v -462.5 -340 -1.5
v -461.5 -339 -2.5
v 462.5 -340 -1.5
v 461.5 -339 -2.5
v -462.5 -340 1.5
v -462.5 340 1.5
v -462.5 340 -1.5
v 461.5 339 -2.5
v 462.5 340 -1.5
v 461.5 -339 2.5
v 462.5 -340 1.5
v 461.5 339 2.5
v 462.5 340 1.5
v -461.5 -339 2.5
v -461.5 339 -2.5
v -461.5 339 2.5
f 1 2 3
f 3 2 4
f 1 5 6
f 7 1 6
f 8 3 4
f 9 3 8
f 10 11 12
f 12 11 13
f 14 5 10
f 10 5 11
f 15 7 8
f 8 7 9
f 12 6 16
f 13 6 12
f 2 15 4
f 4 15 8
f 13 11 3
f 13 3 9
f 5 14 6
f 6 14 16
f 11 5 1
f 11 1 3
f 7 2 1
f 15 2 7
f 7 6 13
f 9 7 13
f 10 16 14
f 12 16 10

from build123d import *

# Parameters (mm, degrees)
F0_W     = 925
F0_H     = 680
F1_DEPTH = 2.5
F2_SIZE  = 1
F3_SIZE  = 1


with BuildPart() as f1:
    # F0 (on Top) → F1 (new body, symmetric)
    with BuildSketch(Plane.XY):
        Rectangle(F0_W, F0_H)
    extrude(amount=F1_DEPTH, both=True)

    # F2
    f2_edges = [f1.edges().sort_by_distance(p)[0] for p in [
        (0, -340, 2.5),
        (462.5, 0, 2.5),
        (0, 340, 2.5),
        (-462.5, 0, 2.5),
    ]]
    chamfer(f2_edges, length=F2_SIZE)

    # F3
    f3_edges = [f1.edges().sort_by_distance(p)[0] for p in [
        (0, 340, -2.5),
        (462.5, 0, -2.5),
        (0, -340, -2.5),
        (-462.5, 0, -2.5),
    ]]
    chamfer(f3_edges, length=F3_SIZE)


solid = f1.part
